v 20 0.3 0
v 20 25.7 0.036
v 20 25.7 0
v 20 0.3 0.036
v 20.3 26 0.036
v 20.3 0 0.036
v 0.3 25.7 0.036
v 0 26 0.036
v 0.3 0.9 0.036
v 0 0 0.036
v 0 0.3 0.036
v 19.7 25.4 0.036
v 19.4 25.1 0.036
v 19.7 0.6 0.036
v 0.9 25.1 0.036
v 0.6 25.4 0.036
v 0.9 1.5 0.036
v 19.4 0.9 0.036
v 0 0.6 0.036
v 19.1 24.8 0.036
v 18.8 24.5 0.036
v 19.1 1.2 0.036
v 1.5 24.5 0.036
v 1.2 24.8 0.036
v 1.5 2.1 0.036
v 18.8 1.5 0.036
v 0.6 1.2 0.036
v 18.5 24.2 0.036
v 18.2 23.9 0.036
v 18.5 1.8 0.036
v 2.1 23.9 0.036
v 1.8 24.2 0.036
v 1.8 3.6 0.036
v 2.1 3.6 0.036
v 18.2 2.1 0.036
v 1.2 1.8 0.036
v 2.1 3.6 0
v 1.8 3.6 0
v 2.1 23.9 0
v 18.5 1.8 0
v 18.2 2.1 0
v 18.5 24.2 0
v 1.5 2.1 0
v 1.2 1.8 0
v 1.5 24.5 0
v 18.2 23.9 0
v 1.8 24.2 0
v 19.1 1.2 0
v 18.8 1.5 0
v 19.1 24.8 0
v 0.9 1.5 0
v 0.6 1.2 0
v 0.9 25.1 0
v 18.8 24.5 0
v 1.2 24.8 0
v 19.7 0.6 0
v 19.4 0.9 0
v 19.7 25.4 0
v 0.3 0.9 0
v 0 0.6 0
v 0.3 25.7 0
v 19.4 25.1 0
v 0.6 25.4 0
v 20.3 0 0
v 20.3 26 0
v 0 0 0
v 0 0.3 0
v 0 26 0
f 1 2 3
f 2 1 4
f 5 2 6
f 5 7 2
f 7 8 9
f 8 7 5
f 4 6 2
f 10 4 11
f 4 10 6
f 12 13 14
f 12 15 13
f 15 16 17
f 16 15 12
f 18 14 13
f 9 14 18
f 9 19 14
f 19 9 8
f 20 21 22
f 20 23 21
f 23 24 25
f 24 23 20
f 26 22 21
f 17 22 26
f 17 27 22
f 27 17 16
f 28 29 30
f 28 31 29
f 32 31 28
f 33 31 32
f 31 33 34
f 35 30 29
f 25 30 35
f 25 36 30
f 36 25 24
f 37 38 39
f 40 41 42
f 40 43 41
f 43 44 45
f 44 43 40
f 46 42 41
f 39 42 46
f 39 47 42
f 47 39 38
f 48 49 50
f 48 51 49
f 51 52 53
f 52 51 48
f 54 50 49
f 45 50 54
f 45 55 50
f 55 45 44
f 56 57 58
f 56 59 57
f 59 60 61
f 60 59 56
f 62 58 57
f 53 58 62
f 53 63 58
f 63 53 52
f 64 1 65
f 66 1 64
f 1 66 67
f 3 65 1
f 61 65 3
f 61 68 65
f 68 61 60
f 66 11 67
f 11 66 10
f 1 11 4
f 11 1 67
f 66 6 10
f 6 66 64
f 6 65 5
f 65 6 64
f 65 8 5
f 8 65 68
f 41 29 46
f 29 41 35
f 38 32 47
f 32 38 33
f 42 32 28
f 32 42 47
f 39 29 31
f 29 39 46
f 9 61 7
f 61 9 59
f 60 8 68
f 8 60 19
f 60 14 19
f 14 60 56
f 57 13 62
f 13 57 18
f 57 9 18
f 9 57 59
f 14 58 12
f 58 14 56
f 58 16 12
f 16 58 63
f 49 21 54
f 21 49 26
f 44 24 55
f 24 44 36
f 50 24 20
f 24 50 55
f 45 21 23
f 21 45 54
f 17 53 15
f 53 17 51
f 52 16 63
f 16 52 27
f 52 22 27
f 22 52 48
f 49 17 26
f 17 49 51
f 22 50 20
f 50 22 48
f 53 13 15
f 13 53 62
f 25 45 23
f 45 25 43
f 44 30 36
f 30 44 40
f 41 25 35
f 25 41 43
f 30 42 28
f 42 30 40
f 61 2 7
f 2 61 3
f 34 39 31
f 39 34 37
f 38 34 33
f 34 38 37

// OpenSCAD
// Physical dimensions
loops = 3;
length = 20;
width = 26;
copper_width = 0.3;
copper_spacing = 0.3;
thickness = 0.03556;

for(i=[0:loops]) {
    // Bottom half horizontal lines
        // Starting condition
	    if(i < 2) {
	            translate([0,2*i*copper_spacing,0])
		                cube([length - 2*i*copper_spacing,copper_width,thickness]);
				    }
				        else {
					        translate([2*(i-1)*copper_spacing,2*i*copper_spacing,0])
						            cube([length - (4*i-2)*copper_spacing,copper_width,thickness]);
							        }

								        // Right half vertical lines
									    translate([length-2*i*copper_spacing,2*i*copper_spacing,0])
									            cube([copper_width,width - 4*i*copper_spacing,thickness]);

											    // Top half horizontal lines
											        translate([2*(loops-i)*copper_spacing,width-2*(loops-i)*copper_spacing-copper_spacing,0])
												        cube([length-4*(loops-i)*copper_spacing,copper_width,thickness]);

													        // Left half vertical lines
														    if(i < 1) {
														            translate([0,2*copper_spacing,0])
															                cube([copper_width,(width - 2*copper_spacing),thickness]);
																	    }
																	        // Last segment must be shorter in order to add the connexion pads
																		    if(i==loops) {
																		            translate([2*i*copper_spacing,2*(i+3)*copper_spacing,0])
																			                cube([copper_width,width-(4*i+6)*copper_spacing,thickness]);
																					    }
																					        else {
																						        translate([2*i*copper_spacing,2*(i+1)*copper_spacing,0])
																							            cube([copper_width,width-(4*i+2)*copper_spacing,thickness]);
																								        }
																									}
